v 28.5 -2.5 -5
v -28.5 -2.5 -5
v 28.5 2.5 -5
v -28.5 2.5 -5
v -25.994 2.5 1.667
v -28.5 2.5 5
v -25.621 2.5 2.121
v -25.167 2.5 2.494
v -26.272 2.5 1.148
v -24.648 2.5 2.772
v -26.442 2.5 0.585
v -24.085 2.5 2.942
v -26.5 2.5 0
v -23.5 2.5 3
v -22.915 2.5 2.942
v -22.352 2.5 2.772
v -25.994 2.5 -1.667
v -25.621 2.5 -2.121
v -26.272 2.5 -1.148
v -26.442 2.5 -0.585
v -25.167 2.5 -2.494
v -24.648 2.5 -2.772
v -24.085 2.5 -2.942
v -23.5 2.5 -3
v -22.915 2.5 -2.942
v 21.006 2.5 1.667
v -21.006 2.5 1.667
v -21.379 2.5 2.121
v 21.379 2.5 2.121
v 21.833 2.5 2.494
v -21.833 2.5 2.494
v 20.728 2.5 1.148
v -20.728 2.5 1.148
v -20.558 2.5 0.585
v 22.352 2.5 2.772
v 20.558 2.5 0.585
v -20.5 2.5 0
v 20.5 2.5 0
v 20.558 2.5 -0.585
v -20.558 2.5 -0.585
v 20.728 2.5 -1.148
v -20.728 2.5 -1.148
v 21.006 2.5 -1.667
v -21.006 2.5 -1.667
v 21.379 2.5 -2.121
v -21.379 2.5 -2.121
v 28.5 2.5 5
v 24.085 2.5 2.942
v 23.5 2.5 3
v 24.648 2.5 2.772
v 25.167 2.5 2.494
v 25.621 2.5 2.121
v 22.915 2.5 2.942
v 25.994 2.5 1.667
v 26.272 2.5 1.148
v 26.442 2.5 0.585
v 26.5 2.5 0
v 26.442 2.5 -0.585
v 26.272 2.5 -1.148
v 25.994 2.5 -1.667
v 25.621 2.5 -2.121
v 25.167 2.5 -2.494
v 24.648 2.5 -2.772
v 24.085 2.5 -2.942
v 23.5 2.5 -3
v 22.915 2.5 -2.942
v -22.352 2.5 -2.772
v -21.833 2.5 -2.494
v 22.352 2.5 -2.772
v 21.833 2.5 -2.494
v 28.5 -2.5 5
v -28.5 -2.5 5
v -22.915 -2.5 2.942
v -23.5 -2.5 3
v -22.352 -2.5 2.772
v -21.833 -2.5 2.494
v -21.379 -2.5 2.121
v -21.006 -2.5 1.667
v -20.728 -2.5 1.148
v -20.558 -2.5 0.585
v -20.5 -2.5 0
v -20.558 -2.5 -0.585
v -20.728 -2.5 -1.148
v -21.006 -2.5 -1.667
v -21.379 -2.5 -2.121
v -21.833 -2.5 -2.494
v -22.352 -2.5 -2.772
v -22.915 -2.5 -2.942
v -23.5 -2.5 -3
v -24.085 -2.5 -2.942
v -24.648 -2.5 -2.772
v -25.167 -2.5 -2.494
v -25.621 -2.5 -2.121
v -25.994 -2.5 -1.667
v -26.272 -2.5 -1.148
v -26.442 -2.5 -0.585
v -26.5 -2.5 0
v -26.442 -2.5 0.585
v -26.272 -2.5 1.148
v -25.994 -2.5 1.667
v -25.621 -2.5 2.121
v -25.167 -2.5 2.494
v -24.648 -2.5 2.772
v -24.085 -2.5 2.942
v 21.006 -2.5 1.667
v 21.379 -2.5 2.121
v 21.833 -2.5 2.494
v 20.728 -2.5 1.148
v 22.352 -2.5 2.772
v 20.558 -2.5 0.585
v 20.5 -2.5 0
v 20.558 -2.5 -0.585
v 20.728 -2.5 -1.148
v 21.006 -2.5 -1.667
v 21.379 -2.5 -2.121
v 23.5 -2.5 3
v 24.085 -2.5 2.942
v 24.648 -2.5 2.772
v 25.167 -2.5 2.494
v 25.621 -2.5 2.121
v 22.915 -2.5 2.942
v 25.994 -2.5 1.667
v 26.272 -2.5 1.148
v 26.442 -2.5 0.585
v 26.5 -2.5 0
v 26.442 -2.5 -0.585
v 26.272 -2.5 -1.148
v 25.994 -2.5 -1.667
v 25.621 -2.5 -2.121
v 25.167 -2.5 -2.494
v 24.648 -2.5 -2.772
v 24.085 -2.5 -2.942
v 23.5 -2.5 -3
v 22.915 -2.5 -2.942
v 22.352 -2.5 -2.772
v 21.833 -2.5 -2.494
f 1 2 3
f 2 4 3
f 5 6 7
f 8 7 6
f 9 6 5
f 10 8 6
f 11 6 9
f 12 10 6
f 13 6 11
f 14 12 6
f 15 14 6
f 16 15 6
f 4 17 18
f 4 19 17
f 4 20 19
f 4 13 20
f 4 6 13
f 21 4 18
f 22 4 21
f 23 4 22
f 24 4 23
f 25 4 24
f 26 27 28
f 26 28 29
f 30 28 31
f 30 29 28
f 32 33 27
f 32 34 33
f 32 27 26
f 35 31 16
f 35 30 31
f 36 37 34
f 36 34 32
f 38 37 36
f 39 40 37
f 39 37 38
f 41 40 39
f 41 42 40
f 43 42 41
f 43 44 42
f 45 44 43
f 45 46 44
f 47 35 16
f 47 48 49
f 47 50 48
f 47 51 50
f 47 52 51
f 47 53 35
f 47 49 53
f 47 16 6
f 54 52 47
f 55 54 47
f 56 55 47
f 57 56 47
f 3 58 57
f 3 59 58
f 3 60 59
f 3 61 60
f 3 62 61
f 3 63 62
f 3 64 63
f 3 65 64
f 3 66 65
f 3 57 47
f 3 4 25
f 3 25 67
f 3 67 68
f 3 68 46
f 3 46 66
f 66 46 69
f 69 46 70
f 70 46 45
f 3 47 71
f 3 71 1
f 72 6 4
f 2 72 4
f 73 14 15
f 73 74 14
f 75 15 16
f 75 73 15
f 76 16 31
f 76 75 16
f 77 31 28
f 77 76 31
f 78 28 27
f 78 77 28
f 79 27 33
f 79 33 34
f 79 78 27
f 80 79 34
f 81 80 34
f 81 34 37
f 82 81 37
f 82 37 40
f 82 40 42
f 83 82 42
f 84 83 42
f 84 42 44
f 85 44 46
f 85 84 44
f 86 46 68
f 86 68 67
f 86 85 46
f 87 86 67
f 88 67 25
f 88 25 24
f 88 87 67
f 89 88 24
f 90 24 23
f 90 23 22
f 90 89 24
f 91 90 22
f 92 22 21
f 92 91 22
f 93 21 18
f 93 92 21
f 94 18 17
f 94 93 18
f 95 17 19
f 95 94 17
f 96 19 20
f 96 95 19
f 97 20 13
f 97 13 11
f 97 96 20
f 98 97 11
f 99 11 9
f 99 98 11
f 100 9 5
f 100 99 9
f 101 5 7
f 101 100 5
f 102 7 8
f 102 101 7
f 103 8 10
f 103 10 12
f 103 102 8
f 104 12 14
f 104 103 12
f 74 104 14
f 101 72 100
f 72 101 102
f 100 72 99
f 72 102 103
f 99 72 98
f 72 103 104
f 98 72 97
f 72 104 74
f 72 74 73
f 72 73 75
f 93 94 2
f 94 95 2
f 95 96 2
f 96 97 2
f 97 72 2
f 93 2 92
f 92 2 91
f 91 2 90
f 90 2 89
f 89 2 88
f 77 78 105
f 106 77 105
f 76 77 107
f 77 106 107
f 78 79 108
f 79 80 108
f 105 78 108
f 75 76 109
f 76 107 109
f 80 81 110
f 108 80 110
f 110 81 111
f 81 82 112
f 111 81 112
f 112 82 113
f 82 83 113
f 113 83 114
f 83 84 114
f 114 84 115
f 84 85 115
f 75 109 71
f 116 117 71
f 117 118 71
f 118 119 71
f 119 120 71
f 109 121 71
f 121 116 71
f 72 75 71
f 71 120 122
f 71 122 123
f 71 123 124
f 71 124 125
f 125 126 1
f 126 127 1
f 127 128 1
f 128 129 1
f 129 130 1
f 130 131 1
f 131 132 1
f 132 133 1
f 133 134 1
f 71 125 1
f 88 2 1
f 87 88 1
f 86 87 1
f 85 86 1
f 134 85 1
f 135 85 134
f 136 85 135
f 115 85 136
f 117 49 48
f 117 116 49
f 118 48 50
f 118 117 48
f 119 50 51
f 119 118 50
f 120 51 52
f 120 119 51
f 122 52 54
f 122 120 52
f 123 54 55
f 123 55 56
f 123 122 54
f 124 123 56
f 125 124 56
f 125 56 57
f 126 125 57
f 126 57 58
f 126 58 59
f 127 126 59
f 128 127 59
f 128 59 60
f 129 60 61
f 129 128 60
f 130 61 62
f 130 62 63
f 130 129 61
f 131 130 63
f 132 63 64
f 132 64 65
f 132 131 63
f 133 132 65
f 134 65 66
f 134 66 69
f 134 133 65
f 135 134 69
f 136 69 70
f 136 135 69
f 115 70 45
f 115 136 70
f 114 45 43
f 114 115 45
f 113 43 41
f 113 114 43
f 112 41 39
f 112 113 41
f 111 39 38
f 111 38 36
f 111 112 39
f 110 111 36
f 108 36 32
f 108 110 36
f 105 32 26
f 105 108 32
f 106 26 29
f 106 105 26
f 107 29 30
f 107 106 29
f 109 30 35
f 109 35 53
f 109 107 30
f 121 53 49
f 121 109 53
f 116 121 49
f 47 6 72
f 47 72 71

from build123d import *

# Parameters (mm, degrees)
SKETCH1_W           = 57
SKETCH1_H           = 10
SKETCH1_R           = 3
BOSS_EXTRUDE1_DEPTH = 2.5


with BuildPart() as part:
    # Sketch1 → Boss-Extrude1 (new, symmetric)
    with BuildSketch(Plane(origin=(0, 0, 0), x_dir=(1, 0, 0), z_dir=(0, 1, 0))):
        Rectangle(SKETCH1_W, SKETCH1_H)
        with Locations(Location((-23.5, 0, 0), (0, 0, 270))):
            Circle(SKETCH1_R, mode=Mode.SUBTRACT)
        with Locations(Location((23.5, 0, 0), (0, 0, 270))):
            Circle(SKETCH1_R, mode=Mode.SUBTRACT)
    extrude(amount=BOSS_EXTRUDE1_DEPTH, both=True)


solid = part.part
